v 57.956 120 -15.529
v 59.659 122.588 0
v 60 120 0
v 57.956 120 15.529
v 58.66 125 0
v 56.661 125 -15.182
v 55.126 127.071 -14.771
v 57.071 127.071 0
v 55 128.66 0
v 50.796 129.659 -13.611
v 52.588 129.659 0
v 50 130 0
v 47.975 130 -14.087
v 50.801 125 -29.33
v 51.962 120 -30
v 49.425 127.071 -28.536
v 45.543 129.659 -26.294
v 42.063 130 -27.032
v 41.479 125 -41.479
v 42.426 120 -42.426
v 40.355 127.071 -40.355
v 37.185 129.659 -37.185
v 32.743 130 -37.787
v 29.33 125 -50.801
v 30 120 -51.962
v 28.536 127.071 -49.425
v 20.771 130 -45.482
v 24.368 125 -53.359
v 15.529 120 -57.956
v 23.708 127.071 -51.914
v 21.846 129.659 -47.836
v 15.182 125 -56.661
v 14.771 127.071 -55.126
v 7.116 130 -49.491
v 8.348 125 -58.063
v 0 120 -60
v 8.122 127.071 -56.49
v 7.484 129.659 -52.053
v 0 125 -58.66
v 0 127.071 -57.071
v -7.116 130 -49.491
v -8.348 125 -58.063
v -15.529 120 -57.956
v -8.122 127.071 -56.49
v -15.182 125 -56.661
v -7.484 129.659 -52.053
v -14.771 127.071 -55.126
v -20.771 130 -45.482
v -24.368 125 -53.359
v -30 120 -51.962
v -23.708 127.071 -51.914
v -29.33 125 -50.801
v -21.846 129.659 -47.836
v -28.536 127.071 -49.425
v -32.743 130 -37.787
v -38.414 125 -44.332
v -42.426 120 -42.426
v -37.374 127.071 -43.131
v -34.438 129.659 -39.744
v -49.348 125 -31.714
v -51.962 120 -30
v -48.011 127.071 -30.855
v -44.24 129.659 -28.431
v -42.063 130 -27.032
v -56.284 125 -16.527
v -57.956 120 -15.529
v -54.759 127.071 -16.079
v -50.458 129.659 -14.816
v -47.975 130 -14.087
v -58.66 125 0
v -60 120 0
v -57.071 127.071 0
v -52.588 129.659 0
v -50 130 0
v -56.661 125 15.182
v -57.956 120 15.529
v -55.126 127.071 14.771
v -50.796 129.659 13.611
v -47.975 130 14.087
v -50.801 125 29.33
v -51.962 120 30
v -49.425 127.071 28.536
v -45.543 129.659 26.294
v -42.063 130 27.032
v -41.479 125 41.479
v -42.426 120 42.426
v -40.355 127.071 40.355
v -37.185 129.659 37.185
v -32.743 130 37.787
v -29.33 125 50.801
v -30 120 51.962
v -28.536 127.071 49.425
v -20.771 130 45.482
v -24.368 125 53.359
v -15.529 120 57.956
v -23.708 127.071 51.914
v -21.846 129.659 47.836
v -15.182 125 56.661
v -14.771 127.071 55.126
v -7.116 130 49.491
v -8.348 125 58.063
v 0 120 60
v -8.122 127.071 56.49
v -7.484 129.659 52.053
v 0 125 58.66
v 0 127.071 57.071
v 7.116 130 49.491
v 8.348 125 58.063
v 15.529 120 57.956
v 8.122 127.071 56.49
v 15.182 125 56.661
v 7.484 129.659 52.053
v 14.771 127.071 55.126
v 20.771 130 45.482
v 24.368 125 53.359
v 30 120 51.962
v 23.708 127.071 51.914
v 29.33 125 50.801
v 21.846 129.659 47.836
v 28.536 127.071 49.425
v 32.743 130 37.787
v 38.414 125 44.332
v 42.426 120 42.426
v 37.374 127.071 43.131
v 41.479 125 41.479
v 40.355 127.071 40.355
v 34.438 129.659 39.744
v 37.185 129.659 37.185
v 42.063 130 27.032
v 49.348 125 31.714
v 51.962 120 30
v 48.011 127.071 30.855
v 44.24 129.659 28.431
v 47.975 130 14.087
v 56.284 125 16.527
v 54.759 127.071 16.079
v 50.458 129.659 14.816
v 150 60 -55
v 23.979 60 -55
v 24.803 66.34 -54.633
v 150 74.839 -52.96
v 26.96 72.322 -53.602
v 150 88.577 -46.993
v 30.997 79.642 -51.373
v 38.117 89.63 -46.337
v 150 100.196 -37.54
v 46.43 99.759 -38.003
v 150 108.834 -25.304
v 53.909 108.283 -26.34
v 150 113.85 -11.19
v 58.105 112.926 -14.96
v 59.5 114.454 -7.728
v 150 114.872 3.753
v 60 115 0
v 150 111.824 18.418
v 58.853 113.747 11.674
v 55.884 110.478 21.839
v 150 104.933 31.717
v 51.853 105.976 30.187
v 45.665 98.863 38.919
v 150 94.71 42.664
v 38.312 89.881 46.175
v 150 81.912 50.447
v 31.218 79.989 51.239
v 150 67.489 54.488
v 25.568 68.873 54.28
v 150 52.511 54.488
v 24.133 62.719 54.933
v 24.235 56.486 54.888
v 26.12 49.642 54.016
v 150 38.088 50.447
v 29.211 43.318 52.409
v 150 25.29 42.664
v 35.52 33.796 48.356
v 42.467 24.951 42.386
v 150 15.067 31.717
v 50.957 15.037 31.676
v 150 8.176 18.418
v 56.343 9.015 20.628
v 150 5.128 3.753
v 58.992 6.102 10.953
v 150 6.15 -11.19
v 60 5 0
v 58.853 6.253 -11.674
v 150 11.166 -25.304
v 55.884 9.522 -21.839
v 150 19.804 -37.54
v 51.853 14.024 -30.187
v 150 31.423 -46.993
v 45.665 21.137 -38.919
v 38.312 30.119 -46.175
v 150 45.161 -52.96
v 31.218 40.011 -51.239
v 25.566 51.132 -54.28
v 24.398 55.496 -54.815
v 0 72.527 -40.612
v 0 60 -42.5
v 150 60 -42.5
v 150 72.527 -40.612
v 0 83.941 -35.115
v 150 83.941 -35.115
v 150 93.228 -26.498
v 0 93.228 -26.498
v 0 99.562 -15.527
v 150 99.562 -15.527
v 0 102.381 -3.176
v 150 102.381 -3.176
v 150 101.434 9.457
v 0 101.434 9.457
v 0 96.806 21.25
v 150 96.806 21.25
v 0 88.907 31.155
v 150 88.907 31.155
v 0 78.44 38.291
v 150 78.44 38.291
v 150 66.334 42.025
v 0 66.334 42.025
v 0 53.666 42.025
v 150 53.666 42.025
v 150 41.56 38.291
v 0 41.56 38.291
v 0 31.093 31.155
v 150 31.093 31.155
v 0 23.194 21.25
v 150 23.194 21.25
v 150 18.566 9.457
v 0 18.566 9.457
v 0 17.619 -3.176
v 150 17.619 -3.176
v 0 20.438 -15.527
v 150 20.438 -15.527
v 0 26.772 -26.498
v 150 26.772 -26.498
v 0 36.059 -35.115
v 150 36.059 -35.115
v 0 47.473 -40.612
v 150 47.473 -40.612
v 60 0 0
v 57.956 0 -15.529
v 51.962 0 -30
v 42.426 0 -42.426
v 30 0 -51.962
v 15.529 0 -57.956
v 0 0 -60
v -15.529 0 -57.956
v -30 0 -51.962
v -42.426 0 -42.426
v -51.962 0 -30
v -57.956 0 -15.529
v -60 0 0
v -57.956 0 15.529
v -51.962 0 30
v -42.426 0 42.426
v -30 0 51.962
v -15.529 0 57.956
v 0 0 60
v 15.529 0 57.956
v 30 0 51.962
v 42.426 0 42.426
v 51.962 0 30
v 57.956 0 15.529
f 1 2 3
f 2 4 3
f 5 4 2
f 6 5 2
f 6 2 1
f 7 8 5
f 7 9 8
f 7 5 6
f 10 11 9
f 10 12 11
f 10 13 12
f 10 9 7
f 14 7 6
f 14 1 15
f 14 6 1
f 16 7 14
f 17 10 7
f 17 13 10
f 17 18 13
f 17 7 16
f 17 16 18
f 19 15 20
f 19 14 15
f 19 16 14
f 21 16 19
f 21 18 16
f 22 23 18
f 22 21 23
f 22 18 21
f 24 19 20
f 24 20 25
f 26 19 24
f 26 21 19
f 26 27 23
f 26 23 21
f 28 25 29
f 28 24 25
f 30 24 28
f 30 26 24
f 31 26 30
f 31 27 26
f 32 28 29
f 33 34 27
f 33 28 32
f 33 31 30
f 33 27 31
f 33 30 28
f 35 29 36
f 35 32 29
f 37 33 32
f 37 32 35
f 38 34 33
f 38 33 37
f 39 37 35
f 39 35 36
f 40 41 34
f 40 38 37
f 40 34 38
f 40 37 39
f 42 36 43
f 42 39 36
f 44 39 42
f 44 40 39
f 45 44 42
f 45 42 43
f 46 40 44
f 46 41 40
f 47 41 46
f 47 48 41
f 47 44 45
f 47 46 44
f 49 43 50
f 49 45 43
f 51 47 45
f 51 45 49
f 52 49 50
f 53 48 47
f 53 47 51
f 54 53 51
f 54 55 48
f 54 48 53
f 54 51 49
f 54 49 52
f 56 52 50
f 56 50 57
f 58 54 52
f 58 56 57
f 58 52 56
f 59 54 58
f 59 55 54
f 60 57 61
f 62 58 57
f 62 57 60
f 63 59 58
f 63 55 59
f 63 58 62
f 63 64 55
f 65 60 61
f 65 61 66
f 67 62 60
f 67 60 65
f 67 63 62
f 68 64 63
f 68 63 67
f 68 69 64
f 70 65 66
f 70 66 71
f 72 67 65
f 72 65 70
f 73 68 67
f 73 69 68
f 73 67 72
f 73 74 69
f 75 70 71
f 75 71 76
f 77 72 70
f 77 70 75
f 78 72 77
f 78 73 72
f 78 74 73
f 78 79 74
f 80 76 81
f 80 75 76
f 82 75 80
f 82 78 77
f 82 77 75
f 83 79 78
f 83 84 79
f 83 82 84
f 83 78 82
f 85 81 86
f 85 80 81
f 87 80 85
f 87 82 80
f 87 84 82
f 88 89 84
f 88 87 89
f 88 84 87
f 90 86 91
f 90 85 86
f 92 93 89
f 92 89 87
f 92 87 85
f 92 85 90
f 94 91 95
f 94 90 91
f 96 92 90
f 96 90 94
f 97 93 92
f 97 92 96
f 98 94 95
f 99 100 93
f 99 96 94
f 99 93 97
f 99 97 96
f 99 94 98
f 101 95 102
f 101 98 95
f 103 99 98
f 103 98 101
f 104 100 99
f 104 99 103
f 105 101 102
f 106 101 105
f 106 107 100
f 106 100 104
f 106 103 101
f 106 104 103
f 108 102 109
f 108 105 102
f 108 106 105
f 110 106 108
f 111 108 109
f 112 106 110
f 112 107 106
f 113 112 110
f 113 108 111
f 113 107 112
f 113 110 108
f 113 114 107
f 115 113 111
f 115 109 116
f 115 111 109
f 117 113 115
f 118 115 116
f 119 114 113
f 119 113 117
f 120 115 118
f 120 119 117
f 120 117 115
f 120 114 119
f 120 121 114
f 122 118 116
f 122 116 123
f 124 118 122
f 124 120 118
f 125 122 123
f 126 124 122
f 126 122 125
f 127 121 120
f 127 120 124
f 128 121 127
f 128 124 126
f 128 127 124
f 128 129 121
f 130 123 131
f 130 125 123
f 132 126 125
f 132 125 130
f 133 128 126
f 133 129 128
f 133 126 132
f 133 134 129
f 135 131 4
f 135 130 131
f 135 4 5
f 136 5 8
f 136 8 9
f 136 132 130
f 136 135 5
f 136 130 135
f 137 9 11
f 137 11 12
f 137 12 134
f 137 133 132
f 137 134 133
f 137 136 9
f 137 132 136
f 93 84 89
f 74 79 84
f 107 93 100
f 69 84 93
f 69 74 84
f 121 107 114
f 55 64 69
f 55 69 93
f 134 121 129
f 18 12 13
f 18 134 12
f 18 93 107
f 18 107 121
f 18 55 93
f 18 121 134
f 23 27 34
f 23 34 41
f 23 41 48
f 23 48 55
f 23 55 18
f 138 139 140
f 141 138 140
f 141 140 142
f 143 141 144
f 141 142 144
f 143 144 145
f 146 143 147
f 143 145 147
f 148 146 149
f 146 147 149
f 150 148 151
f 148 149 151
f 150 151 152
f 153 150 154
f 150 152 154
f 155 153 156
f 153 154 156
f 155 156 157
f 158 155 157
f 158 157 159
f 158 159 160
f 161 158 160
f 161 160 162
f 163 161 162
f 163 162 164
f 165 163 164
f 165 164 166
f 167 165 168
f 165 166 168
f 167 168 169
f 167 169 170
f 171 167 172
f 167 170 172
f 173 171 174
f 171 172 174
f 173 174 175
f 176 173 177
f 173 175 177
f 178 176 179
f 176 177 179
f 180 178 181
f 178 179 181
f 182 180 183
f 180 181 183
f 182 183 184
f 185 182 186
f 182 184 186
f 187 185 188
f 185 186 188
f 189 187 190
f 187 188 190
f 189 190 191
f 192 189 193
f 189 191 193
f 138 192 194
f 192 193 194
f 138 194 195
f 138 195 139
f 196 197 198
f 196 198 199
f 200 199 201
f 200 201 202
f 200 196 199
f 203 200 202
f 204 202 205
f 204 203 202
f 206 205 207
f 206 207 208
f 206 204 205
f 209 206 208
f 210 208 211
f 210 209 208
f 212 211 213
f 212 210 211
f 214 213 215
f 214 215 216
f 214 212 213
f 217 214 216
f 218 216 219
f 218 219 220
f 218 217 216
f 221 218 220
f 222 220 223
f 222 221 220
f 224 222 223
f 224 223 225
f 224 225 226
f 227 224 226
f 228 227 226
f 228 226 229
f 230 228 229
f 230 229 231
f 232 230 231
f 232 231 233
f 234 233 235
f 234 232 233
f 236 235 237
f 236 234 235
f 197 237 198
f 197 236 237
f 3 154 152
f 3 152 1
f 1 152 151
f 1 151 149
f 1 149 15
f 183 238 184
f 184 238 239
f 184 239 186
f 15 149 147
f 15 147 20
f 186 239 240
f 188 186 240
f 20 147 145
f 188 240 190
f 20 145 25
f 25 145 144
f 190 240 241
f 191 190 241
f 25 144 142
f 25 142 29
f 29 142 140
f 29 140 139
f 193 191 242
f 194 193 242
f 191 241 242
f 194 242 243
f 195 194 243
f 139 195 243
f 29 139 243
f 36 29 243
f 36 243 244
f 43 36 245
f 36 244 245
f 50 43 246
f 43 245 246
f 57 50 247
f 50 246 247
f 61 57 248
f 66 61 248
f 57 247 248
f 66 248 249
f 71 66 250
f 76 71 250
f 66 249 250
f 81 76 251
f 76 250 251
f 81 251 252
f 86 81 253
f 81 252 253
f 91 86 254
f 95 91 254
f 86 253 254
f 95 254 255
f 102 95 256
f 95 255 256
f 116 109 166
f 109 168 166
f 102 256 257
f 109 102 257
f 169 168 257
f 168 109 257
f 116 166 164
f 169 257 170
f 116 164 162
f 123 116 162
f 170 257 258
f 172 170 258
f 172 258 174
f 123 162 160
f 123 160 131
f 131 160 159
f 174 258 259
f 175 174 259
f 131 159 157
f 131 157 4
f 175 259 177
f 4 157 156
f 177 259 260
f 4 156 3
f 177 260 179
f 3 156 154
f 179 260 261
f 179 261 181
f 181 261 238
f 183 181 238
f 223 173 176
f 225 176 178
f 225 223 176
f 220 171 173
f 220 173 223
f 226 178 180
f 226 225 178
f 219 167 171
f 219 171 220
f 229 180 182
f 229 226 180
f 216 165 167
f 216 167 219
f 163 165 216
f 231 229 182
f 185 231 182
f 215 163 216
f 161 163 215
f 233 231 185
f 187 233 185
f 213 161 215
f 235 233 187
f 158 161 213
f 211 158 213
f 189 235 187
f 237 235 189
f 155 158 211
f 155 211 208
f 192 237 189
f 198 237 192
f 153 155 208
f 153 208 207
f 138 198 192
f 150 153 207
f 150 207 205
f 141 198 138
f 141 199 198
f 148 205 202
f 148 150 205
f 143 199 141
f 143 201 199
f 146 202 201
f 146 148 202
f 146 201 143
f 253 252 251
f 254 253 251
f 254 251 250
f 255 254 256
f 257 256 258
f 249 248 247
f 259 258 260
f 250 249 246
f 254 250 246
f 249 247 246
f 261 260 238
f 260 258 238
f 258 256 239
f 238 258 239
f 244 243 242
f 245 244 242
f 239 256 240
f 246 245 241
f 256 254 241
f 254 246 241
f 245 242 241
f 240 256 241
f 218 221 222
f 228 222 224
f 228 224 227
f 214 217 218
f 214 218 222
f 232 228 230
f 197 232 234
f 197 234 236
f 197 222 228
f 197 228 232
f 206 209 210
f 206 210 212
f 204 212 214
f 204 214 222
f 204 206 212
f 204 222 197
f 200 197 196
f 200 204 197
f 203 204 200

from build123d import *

# Parameters (mm, degrees)
SKETCH1_R           = 60
BOSS_EXTRUDE1_DEPTH = 130
FILLET1_R           = 10
SKETCH2_R           = 55
BOSS_EXTRUDE2_DEPTH = 150
SKETCH3_R           = 42.5
CUT_EXTRUDE1_DEPTH  = 150


with BuildPart() as part:
    # Sketch1 → Boss-Extrude1 (new body)
    with BuildSketch(Plane(origin=(0, 0, 0), x_dir=(1, 0, 0), z_dir=(0, 1, 0))):
        Circle(SKETCH1_R)
    extrude(amount=BOSS_EXTRUDE1_DEPTH)

    # Fillet1
    fillet1_edges = [part.edges().sort_by_distance(p)[0] for p in [
        (-60, 130, 0),
    ]]
    fillet(fillet1_edges, radius=FILLET1_R)

    # Sketch2 → Boss-Extrude2 (add)
    with BuildSketch(Plane(origin=(0, 0, 0), x_dir=(0, 0, -1), z_dir=(1, 0, 0))):
        with Locations((0, 60)):
            Circle(SKETCH2_R)
    extrude(amount=BOSS_EXTRUDE2_DEPTH)

    # Sketch3 → Cut-Extrude1 (cut)
    with BuildSketch(Plane(origin=(0, 0, 0), x_dir=(0, 0, -1), z_dir=(1, 0, 0))):
        with Locations((0, 60)):
            Circle(SKETCH3_R)
    extrude(amount=CUT_EXTRUDE1_DEPTH, mode=Mode.SUBTRACT)


solid = part.part
